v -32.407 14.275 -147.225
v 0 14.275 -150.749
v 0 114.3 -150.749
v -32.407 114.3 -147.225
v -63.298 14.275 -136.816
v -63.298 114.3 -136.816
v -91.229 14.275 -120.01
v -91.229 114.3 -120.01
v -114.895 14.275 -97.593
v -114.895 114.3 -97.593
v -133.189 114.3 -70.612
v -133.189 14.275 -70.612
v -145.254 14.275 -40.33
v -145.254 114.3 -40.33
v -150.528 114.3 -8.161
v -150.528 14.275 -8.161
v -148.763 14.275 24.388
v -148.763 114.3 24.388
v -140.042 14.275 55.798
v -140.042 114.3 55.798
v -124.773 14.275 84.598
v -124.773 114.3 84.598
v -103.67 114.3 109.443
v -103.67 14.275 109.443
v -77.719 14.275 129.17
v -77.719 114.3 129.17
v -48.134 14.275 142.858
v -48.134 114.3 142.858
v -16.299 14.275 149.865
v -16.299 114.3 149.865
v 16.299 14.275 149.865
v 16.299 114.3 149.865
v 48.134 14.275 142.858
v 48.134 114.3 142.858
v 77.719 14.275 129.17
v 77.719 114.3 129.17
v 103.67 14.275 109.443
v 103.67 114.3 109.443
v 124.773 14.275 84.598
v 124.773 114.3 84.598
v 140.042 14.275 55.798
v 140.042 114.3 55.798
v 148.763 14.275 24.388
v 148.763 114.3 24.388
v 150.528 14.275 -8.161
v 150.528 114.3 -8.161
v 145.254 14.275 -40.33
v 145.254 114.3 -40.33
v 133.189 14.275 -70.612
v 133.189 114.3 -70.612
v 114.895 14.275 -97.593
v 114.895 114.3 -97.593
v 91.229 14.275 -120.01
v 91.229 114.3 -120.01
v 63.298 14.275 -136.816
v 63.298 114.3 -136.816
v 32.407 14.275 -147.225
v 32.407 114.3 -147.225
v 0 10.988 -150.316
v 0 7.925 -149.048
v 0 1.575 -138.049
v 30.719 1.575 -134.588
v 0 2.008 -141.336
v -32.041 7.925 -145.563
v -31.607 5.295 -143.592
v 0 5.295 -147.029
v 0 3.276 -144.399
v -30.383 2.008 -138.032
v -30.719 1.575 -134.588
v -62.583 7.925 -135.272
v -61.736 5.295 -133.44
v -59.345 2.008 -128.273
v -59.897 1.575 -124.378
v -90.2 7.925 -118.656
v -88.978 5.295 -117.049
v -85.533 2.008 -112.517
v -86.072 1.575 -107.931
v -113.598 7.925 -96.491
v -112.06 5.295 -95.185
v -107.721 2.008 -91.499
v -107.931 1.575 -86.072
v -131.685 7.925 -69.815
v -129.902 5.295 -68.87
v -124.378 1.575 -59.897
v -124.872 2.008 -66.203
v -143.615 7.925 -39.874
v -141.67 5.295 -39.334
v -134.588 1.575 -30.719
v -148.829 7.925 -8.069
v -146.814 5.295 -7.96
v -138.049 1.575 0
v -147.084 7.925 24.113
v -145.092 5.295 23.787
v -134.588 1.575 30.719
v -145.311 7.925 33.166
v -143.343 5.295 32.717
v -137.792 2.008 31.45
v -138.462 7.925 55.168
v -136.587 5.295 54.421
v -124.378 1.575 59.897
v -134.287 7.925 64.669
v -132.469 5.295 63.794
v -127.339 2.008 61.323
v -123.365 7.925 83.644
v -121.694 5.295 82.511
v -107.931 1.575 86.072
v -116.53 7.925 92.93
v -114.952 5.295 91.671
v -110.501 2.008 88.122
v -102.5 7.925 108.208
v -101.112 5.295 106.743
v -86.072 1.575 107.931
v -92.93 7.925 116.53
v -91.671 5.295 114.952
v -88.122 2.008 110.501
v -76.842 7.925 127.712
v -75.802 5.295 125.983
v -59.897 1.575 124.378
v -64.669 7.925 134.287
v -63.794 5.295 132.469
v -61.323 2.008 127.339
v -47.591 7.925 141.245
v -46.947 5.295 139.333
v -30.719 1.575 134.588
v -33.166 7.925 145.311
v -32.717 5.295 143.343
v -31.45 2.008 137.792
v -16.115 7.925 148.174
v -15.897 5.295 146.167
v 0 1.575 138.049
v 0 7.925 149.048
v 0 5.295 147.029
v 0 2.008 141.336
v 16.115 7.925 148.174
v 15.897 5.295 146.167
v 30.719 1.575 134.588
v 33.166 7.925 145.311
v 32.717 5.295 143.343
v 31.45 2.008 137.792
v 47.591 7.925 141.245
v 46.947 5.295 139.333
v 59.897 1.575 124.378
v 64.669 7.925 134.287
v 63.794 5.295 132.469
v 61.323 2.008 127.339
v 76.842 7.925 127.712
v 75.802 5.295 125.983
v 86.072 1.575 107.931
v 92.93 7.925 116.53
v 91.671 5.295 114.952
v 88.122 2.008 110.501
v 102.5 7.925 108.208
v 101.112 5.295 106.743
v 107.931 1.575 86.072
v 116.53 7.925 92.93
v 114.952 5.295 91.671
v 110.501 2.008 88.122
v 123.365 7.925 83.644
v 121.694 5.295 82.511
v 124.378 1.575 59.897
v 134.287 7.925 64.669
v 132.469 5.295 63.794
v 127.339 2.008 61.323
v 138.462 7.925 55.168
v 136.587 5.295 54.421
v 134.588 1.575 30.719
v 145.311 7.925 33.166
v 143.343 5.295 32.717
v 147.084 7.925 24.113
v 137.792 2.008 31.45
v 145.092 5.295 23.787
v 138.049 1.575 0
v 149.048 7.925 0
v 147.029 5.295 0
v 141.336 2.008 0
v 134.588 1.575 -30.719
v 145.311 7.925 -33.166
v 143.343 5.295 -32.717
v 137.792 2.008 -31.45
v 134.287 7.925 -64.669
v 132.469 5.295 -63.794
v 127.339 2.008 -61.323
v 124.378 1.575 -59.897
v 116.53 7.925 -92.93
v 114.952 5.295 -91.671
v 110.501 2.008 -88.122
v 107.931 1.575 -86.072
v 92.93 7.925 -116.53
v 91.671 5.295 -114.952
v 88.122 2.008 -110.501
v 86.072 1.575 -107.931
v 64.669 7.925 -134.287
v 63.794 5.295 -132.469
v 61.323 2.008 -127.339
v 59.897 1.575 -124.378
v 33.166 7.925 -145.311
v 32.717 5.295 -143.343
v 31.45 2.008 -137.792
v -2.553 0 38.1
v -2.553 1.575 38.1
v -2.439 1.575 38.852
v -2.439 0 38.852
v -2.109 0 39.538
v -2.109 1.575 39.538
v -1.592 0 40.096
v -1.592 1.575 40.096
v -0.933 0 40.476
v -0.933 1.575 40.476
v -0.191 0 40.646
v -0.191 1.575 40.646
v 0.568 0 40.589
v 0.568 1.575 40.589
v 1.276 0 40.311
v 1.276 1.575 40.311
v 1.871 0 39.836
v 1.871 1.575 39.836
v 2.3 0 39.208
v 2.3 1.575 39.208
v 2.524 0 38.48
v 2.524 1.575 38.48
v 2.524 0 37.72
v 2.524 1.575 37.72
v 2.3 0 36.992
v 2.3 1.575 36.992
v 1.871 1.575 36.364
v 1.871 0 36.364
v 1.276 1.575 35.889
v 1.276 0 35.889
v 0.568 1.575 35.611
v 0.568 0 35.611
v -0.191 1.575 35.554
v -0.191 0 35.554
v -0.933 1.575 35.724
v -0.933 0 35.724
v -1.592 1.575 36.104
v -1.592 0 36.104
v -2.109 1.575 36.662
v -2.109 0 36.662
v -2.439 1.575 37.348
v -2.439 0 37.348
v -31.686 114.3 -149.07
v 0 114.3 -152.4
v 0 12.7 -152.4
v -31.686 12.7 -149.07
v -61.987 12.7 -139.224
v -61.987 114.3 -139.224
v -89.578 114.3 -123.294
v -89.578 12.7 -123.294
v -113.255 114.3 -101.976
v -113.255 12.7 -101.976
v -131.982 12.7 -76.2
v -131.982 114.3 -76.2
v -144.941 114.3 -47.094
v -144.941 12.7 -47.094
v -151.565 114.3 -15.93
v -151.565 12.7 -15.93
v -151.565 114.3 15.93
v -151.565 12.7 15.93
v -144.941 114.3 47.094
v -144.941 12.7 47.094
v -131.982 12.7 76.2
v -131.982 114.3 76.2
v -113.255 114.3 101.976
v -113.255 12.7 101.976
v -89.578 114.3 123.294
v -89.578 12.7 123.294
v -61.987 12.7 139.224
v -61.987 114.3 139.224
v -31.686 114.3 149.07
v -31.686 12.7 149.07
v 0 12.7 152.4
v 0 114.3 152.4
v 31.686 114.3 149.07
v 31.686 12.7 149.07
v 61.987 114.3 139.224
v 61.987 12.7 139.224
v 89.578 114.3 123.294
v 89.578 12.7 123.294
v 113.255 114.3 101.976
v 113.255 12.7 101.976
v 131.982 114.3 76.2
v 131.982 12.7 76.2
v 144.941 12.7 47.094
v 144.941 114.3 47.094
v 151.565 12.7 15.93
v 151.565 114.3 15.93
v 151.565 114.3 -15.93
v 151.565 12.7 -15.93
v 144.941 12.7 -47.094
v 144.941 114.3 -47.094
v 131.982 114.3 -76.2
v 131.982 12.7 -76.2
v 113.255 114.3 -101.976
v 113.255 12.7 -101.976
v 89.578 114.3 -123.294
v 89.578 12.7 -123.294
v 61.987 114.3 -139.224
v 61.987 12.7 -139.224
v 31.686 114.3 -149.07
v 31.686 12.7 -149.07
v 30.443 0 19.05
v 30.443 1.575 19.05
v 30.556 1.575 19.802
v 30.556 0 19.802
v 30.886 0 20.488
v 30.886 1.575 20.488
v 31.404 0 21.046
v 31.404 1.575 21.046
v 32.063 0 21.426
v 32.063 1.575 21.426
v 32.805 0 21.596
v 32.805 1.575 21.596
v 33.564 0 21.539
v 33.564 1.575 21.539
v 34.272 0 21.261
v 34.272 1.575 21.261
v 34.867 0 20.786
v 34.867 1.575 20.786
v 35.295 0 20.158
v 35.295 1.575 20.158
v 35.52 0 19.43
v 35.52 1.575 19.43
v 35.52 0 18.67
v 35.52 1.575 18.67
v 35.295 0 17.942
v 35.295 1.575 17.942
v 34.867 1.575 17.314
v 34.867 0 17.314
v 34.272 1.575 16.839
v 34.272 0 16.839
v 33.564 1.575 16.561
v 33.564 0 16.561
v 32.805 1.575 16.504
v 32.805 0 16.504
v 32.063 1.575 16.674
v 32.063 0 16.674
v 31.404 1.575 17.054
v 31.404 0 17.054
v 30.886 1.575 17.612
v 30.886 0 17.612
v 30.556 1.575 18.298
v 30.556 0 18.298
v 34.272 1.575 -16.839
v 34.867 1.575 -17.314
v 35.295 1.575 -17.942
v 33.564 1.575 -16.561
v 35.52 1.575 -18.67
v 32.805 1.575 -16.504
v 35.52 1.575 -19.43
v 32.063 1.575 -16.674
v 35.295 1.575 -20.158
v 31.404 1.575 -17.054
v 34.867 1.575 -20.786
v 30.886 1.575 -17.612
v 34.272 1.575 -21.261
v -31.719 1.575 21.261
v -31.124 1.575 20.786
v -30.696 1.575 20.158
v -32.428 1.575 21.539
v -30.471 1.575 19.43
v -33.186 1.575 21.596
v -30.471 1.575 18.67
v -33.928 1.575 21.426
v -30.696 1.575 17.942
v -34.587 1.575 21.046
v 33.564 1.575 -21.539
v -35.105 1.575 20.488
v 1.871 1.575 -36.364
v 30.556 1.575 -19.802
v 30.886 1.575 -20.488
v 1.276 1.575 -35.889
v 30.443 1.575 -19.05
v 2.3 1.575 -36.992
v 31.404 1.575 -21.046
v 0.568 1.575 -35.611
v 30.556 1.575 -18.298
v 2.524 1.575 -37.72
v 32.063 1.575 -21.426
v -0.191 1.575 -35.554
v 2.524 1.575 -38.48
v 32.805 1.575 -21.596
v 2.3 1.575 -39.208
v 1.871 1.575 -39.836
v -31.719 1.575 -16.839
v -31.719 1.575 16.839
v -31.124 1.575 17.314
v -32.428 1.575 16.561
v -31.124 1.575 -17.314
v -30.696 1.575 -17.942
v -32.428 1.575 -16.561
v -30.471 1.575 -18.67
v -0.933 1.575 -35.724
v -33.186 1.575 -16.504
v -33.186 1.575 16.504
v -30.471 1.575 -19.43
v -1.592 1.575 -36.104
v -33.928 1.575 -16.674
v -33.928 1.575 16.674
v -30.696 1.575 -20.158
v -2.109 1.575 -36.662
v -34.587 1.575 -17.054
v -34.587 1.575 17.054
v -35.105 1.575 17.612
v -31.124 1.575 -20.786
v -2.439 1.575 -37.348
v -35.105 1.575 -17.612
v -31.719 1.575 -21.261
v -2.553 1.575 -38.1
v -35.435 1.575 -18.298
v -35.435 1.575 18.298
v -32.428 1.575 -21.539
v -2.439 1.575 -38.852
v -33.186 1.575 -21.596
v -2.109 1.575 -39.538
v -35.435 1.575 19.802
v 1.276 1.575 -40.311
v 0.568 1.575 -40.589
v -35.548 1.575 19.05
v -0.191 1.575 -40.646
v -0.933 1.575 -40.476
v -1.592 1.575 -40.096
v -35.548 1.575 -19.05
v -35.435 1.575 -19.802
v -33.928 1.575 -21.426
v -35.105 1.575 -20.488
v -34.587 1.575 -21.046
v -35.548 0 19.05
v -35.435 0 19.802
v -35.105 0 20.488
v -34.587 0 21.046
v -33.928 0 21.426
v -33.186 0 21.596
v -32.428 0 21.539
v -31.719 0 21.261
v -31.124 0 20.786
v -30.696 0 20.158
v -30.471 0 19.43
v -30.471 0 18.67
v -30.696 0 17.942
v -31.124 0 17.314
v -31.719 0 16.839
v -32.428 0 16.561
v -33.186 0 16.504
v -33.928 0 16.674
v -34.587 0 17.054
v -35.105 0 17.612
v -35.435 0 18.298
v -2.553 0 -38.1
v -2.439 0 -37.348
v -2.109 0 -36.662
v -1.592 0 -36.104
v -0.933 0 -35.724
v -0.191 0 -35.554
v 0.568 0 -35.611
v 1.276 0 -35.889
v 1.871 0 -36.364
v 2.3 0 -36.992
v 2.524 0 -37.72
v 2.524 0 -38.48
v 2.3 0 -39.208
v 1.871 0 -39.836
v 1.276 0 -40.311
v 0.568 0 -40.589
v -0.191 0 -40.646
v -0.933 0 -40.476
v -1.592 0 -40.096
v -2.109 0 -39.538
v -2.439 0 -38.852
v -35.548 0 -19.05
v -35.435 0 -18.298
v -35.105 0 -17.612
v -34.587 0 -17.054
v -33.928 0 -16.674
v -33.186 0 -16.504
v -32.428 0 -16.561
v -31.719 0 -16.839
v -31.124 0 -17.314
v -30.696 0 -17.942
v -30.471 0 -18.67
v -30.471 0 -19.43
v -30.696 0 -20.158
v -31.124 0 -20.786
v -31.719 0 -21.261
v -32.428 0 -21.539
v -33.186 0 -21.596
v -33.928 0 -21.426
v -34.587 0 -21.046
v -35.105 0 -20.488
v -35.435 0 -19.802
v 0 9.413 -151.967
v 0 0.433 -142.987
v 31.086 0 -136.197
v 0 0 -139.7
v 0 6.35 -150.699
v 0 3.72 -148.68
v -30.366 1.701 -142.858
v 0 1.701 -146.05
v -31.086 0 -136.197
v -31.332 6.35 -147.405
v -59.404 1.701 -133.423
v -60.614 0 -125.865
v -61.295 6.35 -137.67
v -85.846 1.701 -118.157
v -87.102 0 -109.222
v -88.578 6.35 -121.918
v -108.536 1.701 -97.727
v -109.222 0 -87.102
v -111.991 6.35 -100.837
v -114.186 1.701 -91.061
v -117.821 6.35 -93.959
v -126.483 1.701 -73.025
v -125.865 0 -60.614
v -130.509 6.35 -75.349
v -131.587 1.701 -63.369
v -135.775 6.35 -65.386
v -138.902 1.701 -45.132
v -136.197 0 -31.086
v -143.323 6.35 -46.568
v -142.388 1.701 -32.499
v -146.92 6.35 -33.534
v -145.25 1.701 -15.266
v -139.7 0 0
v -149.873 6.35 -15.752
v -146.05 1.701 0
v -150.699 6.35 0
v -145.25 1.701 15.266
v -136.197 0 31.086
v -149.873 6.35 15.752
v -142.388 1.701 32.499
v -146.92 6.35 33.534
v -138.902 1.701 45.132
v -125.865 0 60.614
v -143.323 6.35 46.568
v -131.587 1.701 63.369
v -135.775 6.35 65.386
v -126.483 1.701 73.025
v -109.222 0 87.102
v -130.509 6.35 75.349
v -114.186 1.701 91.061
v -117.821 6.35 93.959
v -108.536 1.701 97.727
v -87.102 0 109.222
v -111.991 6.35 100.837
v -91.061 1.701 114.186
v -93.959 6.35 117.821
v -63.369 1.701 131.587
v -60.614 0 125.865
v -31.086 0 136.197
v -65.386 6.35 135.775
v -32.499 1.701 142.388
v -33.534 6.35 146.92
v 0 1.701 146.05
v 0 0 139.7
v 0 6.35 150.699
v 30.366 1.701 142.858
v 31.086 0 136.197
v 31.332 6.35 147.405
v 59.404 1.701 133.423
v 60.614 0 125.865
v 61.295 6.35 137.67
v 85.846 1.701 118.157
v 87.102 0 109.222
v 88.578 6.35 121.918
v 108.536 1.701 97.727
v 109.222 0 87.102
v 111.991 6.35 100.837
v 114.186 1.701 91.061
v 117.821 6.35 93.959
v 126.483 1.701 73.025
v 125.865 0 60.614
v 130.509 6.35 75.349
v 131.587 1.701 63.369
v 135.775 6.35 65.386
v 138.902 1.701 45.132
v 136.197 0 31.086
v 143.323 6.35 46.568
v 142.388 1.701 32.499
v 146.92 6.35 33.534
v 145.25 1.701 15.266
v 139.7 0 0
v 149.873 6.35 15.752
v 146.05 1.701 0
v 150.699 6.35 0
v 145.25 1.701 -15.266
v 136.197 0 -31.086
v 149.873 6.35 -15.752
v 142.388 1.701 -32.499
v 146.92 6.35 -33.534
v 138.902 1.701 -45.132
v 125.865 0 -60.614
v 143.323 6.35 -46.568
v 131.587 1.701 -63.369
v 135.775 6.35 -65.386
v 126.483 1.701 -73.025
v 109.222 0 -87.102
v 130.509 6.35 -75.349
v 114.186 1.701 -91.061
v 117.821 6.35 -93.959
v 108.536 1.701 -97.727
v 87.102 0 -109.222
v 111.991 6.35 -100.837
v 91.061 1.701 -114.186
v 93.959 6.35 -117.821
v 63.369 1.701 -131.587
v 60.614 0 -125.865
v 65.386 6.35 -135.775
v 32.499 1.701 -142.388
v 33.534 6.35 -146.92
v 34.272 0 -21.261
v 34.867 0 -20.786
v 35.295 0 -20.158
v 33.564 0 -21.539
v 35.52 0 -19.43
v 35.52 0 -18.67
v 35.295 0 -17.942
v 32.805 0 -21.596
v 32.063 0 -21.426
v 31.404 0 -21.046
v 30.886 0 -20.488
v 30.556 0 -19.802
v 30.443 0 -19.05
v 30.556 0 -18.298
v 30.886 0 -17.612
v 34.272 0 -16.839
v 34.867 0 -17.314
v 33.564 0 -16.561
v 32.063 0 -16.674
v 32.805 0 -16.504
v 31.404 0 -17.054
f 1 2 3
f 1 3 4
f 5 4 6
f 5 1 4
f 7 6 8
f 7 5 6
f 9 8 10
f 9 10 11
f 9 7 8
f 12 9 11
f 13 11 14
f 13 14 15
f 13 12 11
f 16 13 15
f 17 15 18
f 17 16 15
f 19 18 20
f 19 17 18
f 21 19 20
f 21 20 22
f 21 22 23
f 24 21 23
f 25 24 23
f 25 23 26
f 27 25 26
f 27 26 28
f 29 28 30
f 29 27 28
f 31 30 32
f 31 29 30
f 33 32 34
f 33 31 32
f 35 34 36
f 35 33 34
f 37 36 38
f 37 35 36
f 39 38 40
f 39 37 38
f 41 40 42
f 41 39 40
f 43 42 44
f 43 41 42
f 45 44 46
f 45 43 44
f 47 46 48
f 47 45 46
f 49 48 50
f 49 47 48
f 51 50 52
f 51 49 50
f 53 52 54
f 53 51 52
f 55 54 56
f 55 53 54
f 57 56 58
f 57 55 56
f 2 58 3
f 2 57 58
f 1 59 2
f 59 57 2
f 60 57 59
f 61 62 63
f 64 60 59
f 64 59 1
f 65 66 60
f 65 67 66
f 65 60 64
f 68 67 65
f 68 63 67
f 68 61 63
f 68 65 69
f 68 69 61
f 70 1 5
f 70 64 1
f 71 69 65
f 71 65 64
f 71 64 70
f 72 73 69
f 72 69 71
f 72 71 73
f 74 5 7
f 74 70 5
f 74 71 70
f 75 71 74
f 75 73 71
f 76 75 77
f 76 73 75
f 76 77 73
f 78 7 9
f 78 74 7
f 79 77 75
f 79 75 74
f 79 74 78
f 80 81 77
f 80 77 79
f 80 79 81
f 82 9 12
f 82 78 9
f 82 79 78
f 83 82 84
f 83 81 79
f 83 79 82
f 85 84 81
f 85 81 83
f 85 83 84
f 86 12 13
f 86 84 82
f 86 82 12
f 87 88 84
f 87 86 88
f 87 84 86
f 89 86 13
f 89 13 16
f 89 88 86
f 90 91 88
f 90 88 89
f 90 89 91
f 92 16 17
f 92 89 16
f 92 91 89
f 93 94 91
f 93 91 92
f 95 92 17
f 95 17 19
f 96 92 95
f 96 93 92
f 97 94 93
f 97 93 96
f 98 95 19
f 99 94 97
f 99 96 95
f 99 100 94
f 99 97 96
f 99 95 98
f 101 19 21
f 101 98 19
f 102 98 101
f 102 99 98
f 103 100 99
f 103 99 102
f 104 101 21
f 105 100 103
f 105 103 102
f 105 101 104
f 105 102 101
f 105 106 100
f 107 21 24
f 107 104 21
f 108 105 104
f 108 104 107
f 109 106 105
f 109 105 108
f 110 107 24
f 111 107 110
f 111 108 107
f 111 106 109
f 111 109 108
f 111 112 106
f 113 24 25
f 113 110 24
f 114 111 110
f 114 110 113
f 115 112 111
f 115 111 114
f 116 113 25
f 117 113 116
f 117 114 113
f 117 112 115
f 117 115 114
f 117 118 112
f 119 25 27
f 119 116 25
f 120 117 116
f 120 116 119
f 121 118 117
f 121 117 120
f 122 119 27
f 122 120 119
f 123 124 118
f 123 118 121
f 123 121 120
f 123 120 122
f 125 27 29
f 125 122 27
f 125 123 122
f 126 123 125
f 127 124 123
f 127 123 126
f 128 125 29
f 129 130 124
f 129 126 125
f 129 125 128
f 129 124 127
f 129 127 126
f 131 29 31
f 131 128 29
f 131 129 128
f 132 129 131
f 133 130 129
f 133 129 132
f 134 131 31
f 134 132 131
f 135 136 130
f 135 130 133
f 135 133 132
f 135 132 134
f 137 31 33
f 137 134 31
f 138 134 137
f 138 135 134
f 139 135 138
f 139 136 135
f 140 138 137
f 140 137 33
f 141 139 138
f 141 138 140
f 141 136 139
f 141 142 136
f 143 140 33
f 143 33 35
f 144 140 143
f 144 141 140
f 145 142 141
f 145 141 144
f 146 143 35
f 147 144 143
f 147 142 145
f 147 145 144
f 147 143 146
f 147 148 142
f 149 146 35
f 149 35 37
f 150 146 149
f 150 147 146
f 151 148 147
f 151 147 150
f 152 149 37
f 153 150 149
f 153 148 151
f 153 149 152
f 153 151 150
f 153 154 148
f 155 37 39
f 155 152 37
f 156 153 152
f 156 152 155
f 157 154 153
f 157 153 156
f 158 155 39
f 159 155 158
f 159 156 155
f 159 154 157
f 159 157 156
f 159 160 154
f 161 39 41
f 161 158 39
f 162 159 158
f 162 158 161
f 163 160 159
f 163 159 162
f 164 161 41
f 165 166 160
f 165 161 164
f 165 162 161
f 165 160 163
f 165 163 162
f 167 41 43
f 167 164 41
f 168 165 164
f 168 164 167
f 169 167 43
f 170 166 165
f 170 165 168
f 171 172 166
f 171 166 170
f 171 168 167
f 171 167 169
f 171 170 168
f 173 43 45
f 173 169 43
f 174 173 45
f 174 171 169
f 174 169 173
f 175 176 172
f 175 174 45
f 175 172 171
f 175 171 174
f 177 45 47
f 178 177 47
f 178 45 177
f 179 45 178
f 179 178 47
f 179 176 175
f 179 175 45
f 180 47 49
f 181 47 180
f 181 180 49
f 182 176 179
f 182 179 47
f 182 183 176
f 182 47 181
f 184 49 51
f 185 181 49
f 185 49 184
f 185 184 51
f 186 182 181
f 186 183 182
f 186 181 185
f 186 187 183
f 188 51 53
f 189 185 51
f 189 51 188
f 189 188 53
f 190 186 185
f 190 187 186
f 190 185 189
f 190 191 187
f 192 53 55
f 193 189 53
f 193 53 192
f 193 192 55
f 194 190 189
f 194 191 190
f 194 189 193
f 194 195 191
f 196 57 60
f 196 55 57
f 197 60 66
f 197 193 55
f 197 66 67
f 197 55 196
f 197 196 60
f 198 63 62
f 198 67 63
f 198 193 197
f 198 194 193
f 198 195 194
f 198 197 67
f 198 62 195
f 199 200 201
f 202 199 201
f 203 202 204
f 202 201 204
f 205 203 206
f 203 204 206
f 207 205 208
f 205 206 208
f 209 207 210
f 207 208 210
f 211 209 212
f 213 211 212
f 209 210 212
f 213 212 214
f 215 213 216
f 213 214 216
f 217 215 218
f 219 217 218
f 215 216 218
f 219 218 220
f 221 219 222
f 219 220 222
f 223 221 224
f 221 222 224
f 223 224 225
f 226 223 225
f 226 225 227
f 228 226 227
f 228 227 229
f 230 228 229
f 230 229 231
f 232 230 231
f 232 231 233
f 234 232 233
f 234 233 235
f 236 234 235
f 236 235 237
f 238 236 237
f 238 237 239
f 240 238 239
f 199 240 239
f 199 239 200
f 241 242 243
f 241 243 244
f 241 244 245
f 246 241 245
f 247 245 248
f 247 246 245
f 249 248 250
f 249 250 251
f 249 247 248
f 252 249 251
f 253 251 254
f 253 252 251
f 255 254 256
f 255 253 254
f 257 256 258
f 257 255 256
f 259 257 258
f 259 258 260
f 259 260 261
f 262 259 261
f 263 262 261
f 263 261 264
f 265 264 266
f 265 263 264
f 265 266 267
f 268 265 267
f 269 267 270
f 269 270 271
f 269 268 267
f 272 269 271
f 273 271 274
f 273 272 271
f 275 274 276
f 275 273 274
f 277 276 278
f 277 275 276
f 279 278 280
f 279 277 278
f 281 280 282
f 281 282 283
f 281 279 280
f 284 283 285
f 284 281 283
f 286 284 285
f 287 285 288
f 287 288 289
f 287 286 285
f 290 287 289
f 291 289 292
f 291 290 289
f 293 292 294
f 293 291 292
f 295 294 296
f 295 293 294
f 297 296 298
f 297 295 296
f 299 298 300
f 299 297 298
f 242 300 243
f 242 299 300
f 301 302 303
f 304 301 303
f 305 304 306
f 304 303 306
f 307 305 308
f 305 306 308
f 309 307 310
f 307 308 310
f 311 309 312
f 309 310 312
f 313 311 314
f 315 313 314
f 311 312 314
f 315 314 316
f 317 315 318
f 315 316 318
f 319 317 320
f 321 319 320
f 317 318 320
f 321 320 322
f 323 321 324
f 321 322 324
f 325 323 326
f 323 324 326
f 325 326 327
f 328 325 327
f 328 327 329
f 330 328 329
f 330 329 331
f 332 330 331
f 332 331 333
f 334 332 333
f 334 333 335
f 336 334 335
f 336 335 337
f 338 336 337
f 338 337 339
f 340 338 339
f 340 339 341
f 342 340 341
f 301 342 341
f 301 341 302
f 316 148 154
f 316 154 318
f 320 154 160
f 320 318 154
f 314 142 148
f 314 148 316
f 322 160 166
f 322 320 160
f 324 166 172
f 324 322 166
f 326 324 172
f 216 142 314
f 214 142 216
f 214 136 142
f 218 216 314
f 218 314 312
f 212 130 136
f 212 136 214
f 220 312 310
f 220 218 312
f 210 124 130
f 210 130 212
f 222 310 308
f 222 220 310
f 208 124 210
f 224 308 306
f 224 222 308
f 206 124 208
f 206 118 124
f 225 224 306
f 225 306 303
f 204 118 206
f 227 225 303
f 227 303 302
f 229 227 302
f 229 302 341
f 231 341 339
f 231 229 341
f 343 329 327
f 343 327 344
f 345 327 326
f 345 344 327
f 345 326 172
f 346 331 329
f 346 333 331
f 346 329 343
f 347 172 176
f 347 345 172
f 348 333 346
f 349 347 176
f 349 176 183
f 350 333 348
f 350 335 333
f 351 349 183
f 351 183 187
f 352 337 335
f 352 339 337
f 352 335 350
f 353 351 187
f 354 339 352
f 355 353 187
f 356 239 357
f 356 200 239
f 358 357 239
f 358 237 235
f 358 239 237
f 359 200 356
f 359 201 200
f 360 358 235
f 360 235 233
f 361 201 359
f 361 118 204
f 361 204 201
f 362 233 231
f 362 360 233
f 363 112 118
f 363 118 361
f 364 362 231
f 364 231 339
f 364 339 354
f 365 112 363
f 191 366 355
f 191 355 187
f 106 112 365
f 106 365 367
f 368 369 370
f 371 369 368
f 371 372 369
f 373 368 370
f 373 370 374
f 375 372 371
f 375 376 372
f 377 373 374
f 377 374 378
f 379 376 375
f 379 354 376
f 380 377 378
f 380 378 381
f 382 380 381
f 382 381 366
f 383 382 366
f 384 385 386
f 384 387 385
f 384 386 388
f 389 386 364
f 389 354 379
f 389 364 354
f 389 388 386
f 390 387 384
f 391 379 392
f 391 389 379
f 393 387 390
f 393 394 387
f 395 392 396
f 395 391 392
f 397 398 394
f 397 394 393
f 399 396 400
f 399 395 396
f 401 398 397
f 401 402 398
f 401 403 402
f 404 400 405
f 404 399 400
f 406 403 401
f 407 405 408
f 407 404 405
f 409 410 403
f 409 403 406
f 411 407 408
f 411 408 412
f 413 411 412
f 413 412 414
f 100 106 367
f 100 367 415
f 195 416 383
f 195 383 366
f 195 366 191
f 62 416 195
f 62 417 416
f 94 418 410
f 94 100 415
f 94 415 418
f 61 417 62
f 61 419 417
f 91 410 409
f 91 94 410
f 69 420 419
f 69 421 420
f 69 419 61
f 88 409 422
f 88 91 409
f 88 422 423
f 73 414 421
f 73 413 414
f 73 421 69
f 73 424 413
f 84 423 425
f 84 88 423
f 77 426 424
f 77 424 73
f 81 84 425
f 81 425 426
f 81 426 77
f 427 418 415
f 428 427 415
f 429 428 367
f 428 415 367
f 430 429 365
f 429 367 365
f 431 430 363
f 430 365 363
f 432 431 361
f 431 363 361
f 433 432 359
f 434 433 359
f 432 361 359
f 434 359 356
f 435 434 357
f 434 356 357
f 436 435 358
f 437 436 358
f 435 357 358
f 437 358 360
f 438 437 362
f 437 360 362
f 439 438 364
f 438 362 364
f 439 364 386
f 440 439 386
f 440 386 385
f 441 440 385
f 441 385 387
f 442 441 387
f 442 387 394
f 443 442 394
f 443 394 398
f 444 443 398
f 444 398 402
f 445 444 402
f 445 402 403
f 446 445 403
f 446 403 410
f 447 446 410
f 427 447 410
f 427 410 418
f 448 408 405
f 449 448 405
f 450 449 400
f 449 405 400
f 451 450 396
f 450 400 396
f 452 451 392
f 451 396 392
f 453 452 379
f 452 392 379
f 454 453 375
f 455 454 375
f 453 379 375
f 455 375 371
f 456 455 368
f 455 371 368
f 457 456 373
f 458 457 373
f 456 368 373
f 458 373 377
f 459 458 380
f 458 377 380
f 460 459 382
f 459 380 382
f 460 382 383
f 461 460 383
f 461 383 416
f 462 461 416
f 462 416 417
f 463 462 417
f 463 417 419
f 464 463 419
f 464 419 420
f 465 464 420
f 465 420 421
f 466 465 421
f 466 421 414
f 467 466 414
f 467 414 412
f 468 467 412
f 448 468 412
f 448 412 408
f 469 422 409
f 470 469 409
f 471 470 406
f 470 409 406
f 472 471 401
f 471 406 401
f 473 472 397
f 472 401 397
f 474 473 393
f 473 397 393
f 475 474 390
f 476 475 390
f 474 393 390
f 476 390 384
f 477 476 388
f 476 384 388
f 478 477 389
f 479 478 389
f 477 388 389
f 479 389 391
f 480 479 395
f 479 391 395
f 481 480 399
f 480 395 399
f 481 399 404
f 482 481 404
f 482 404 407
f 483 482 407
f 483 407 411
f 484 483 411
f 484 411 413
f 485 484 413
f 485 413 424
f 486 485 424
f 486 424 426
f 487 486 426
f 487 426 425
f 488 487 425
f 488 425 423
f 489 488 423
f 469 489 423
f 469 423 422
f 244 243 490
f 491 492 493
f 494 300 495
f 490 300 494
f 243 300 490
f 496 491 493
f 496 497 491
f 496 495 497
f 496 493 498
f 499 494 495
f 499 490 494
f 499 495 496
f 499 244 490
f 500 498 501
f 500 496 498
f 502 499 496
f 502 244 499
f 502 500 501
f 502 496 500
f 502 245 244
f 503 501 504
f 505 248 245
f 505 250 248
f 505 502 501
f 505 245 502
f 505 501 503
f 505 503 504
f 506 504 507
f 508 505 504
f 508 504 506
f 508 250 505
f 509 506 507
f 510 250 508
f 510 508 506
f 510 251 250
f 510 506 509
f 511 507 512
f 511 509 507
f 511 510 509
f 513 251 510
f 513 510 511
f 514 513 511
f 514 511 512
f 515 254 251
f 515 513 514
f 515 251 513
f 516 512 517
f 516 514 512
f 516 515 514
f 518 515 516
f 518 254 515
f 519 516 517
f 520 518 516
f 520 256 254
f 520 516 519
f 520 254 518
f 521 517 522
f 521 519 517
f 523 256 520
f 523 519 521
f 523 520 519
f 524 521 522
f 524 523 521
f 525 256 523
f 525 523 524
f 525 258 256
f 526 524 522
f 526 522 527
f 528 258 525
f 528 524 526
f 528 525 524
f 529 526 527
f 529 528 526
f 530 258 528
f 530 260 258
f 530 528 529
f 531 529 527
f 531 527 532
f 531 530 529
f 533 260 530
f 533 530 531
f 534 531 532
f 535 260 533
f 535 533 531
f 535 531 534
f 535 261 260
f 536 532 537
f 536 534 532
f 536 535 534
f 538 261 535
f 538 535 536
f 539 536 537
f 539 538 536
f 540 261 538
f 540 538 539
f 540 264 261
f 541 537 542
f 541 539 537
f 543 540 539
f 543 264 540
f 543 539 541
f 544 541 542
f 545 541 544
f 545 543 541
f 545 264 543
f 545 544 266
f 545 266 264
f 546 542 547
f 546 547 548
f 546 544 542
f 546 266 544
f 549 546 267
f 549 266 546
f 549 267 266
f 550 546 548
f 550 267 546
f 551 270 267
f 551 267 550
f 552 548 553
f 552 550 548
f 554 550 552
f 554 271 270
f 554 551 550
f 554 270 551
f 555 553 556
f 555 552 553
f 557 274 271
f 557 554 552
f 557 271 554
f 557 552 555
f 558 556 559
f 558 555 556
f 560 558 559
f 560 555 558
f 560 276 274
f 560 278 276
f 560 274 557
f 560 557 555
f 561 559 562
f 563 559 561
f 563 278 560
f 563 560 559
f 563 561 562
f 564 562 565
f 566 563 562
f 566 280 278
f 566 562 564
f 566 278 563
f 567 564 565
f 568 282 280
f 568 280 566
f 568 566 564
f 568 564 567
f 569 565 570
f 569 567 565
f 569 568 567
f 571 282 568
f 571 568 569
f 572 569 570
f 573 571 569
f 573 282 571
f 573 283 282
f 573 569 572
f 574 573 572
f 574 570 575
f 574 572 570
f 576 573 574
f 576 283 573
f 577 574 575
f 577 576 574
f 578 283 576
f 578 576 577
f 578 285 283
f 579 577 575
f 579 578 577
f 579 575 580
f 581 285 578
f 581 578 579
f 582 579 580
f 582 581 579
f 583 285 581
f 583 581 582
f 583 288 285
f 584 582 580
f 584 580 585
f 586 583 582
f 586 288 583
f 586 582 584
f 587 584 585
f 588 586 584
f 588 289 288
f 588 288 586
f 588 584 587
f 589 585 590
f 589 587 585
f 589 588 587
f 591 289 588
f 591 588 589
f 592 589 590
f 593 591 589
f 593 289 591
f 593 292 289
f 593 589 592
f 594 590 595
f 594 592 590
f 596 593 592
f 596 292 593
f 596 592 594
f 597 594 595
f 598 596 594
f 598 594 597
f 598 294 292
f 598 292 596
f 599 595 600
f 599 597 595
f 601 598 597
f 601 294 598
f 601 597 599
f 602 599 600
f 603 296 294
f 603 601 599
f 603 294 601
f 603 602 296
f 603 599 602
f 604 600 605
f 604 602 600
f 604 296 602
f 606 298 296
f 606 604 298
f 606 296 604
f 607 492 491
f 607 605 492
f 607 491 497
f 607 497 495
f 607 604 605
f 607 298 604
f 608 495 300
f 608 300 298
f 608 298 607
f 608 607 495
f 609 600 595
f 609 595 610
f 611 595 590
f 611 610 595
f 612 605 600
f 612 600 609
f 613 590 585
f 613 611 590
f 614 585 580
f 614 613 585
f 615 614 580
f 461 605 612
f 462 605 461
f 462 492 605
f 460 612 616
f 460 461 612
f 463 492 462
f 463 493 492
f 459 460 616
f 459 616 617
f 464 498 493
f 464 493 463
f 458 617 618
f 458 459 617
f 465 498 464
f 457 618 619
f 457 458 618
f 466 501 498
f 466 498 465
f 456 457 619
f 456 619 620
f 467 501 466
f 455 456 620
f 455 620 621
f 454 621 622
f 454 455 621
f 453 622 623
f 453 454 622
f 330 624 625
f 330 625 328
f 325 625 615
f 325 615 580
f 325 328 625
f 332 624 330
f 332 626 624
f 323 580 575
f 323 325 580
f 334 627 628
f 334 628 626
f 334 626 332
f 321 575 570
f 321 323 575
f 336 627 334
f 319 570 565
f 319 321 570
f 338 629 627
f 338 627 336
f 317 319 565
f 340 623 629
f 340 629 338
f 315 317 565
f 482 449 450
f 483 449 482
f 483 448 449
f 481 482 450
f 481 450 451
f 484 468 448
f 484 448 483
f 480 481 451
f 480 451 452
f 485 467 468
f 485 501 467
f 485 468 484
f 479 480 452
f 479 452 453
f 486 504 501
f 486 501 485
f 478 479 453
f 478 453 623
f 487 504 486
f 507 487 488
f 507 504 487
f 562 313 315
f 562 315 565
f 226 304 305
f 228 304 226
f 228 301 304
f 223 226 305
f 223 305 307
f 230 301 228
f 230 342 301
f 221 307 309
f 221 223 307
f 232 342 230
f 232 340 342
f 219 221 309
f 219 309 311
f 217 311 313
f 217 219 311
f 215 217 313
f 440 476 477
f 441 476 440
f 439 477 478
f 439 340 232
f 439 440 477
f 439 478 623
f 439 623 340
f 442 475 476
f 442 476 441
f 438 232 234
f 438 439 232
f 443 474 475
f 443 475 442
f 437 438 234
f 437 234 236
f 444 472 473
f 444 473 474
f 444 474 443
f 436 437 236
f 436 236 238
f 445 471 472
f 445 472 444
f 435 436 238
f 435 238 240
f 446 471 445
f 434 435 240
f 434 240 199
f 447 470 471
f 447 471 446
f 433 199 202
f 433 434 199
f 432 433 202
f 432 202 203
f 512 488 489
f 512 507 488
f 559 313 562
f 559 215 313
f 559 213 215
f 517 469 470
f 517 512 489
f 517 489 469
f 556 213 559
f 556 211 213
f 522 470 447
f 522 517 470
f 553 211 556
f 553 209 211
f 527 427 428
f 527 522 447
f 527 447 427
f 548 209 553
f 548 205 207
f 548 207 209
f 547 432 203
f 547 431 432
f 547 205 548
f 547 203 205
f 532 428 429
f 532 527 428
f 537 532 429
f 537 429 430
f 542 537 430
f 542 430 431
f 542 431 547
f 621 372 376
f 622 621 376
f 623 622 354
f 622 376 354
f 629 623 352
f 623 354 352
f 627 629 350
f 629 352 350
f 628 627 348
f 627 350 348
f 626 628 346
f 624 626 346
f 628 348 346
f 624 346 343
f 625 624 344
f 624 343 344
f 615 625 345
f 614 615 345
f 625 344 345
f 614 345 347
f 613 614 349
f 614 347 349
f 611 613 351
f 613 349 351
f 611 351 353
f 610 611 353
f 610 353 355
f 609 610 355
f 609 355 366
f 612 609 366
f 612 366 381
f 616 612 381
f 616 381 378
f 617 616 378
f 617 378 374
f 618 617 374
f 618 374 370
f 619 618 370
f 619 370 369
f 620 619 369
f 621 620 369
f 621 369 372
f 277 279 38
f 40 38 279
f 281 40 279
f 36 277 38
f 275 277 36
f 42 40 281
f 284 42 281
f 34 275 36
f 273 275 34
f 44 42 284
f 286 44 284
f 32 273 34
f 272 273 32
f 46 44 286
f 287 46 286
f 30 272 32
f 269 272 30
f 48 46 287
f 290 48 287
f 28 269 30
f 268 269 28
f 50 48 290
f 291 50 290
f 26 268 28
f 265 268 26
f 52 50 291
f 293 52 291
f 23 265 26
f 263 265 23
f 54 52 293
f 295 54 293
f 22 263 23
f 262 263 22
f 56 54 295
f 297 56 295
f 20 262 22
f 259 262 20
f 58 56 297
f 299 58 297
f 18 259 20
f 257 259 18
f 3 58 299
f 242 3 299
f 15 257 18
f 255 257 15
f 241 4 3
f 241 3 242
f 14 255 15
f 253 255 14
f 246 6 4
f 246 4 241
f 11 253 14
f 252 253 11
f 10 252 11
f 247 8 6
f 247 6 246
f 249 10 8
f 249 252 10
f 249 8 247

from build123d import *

# Parameters (mm, degrees)
FILLET1_R              = 12.7
F_10_CLEARANCE_HOLE1_D = 5.1054


with BuildPart() as part:
    # Sketch1 → Revolve1 (revolve)
    with BuildSketch(Plane.XY, mode=Mode.PRIVATE) as revolve1_sk:
        Polygon((0, 0), (152.4, 0), (152.4, 114.3), (150.749, 114.3), (150.749, 1.5748), (0, 1.5748), align=None)
    revolve(revolve1_sk.sketch.rotate(Axis((0, 0, 0), (0, 1, 0)), 90), axis=Axis((0, 0, 0), (0, 1, 0)))

    # Fillet1
    fillet1_edges = [part.edges().sort_by_distance(p)[0] for p in [
        (0, 1.5748, 150.749),
        (0, 0, 152.4),
    ]]
    fillet(fillet1_edges, radius=FILLET1_R)

    # #10 Clearance Hole1 (through all)
    with Locations(Plane.XZ):
        with Locations((0, 38.1), (32.995567884, 19.05), (32.995567884, -19.05), (0, -38.1), (-32.995567884, -19.05), (-32.995567884, 19.05)):
            Hole(F_10_CLEARANCE_HOLE1_D / 2)


solid = part.part
